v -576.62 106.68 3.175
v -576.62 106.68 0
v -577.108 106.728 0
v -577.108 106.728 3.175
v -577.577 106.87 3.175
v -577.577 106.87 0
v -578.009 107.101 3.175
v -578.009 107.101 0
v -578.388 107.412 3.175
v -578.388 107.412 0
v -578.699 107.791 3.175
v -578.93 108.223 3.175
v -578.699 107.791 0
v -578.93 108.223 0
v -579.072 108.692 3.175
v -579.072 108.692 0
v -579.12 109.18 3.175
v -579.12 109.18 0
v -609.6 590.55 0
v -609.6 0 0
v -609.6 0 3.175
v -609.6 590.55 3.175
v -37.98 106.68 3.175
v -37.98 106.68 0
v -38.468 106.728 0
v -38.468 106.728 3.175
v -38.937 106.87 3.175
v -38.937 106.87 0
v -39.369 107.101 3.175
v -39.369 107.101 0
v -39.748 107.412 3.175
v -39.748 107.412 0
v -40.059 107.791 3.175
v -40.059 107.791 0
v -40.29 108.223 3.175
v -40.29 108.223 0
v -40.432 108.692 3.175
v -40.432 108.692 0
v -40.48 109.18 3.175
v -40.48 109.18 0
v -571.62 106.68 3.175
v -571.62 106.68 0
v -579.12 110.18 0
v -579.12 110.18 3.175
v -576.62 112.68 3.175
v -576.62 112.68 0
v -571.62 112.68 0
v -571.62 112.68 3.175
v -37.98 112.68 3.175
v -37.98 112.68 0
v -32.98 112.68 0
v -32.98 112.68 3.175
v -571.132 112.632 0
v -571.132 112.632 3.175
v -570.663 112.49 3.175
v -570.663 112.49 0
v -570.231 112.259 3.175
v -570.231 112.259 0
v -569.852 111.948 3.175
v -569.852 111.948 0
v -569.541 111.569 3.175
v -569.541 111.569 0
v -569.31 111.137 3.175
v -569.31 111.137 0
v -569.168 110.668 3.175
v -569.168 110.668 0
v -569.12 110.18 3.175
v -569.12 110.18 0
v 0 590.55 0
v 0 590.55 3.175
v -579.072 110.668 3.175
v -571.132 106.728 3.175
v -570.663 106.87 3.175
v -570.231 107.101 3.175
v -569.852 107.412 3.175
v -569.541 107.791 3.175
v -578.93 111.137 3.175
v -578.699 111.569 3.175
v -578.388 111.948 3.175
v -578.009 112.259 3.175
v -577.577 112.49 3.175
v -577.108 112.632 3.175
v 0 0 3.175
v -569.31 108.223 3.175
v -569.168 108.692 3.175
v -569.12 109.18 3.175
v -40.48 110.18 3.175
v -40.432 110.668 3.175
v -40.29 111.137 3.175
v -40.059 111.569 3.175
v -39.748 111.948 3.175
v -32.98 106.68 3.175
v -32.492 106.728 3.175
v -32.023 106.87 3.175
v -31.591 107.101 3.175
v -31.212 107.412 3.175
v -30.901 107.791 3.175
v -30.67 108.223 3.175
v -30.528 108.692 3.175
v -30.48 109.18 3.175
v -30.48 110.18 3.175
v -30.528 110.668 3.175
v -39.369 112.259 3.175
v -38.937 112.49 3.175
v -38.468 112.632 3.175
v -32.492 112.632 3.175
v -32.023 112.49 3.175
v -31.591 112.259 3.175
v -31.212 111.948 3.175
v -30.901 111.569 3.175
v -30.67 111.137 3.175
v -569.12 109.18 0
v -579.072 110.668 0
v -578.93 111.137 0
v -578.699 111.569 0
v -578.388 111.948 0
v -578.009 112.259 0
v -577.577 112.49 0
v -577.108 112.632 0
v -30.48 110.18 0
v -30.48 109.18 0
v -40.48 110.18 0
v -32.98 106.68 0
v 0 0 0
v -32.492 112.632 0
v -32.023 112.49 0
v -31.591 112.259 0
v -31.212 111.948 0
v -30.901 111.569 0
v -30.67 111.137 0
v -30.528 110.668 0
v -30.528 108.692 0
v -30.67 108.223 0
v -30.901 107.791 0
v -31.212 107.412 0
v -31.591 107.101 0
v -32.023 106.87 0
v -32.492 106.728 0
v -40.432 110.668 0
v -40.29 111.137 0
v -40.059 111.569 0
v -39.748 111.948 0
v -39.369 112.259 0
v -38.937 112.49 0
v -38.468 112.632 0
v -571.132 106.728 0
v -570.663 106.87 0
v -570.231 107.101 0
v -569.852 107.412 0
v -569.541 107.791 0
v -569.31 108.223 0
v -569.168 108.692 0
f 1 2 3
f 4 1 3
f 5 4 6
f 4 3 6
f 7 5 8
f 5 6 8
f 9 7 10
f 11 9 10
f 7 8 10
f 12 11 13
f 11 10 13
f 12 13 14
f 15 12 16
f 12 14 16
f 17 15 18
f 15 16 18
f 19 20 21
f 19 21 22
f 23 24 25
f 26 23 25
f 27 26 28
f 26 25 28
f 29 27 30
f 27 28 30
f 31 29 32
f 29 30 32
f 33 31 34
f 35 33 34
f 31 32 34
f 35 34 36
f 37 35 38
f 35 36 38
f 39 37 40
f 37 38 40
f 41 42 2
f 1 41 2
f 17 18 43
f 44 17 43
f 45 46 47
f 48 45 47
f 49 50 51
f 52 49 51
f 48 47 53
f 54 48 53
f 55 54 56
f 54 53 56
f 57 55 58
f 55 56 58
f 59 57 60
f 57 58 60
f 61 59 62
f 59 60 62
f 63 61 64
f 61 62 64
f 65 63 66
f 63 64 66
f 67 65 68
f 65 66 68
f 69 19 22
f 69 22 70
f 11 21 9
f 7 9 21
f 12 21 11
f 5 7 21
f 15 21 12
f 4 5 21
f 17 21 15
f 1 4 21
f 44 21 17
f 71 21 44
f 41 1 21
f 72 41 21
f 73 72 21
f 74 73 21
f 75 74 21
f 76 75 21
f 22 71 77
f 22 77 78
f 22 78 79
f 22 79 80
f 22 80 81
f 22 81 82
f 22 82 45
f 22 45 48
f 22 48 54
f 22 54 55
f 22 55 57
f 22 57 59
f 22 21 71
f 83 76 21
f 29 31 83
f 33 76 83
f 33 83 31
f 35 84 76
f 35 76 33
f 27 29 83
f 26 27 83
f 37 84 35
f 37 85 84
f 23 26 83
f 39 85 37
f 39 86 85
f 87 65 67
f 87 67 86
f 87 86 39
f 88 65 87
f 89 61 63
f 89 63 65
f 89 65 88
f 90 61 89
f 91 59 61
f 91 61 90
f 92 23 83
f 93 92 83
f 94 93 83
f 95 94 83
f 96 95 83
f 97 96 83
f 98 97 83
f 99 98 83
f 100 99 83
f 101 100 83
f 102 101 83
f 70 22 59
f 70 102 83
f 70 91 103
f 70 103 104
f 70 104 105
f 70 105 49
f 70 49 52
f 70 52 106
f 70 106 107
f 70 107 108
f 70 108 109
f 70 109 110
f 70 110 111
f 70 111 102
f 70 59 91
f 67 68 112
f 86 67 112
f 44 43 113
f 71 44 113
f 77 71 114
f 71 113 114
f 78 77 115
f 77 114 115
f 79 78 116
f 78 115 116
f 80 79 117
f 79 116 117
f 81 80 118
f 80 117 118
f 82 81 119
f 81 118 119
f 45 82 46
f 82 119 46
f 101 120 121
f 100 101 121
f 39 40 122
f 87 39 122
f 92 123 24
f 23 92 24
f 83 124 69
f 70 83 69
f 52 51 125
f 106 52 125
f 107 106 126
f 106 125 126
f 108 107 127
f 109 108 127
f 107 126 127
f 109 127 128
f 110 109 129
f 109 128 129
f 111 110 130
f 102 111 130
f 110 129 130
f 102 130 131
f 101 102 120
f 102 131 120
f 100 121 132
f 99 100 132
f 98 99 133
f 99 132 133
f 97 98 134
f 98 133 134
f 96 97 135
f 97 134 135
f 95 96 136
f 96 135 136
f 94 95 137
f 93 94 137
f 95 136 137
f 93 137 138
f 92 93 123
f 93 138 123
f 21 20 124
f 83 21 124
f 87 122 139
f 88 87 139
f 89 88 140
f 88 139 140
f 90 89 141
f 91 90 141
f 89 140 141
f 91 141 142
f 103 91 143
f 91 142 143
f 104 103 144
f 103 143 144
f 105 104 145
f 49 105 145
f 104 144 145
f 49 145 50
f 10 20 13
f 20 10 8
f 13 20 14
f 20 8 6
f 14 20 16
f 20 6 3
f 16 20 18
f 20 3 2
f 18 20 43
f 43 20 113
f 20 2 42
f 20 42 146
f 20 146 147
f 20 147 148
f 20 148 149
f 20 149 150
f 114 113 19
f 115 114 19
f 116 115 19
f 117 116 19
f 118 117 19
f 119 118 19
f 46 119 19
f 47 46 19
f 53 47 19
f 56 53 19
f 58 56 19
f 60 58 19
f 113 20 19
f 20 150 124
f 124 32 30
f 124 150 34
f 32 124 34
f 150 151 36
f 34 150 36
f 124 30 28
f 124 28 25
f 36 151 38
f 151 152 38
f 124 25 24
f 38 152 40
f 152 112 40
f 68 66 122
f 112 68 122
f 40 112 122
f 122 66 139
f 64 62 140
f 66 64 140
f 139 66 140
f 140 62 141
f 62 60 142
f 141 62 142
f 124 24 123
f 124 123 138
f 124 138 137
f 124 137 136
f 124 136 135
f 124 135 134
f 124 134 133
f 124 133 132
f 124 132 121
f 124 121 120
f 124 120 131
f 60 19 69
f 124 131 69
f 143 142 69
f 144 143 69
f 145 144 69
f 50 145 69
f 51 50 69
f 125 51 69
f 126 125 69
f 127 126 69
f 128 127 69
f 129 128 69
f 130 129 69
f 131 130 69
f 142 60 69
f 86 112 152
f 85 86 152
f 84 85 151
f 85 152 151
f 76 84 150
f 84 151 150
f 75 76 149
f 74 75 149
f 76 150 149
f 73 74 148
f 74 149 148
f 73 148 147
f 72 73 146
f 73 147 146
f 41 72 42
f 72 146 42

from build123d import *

# Parameters (mm, degrees)
SKETCH1_W           = 609.6
SKETCH1_H           = 590.55
BOSS_EXTRUDE1_DEPTH = 3.175


with BuildPart() as part:
    # Sketch1 → Boss-Extrude1 (new body)
    with BuildSketch(Plane.XY):
        with Locations((-304.8, 295.275)):
            Rectangle(SKETCH1_W, SKETCH1_H)
        with BuildLine():
            Line((-579.12, 109.18), (-579.12, 110.18))
            ThreePointArc((-579.12, 110.18), (-578.387766953, 111.947766953), (-576.62, 112.68))
            Line((-576.62, 112.68), (-571.62, 112.68))
            ThreePointArc((-571.62, 112.68), (-569.852233047, 111.947766953), (-569.12, 110.18))
            Line((-569.12, 110.18), (-569.12, 109.18))
            ThreePointArc((-569.12, 109.18), (-569.852233047, 107.412233047), (-571.62, 106.68))
            Line((-571.62, 106.68), (-576.62, 106.68))
            ThreePointArc((-576.62, 106.68), (-578.387766953, 107.412233047), (-579.12, 109.18))
        make_face(mode=Mode.SUBTRACT)
        with BuildLine():
            Line((-32.98, 106.68), (-37.98, 106.68))
            ThreePointArc((-37.98, 106.68), (-39.747766953, 107.412233047), (-40.48, 109.18))
            Line((-40.48, 109.18), (-40.48, 110.18))
            ThreePointArc((-40.48, 110.18), (-39.747766953, 111.947766953), (-37.98, 112.68))
            Line((-37.98, 112.68), (-32.98, 112.68))
            ThreePointArc((-32.98, 112.68), (-31.212233047, 111.947766953), (-30.48, 110.18))
            Line((-30.48, 110.18), (-30.48, 109.18))
            ThreePointArc((-30.48, 109.18), (-31.212233047, 107.412233047), (-32.98, 106.68))
        make_face(mode=Mode.SUBTRACT)
    extrude(amount=BOSS_EXTRUDE1_DEPTH)


solid = part.part
